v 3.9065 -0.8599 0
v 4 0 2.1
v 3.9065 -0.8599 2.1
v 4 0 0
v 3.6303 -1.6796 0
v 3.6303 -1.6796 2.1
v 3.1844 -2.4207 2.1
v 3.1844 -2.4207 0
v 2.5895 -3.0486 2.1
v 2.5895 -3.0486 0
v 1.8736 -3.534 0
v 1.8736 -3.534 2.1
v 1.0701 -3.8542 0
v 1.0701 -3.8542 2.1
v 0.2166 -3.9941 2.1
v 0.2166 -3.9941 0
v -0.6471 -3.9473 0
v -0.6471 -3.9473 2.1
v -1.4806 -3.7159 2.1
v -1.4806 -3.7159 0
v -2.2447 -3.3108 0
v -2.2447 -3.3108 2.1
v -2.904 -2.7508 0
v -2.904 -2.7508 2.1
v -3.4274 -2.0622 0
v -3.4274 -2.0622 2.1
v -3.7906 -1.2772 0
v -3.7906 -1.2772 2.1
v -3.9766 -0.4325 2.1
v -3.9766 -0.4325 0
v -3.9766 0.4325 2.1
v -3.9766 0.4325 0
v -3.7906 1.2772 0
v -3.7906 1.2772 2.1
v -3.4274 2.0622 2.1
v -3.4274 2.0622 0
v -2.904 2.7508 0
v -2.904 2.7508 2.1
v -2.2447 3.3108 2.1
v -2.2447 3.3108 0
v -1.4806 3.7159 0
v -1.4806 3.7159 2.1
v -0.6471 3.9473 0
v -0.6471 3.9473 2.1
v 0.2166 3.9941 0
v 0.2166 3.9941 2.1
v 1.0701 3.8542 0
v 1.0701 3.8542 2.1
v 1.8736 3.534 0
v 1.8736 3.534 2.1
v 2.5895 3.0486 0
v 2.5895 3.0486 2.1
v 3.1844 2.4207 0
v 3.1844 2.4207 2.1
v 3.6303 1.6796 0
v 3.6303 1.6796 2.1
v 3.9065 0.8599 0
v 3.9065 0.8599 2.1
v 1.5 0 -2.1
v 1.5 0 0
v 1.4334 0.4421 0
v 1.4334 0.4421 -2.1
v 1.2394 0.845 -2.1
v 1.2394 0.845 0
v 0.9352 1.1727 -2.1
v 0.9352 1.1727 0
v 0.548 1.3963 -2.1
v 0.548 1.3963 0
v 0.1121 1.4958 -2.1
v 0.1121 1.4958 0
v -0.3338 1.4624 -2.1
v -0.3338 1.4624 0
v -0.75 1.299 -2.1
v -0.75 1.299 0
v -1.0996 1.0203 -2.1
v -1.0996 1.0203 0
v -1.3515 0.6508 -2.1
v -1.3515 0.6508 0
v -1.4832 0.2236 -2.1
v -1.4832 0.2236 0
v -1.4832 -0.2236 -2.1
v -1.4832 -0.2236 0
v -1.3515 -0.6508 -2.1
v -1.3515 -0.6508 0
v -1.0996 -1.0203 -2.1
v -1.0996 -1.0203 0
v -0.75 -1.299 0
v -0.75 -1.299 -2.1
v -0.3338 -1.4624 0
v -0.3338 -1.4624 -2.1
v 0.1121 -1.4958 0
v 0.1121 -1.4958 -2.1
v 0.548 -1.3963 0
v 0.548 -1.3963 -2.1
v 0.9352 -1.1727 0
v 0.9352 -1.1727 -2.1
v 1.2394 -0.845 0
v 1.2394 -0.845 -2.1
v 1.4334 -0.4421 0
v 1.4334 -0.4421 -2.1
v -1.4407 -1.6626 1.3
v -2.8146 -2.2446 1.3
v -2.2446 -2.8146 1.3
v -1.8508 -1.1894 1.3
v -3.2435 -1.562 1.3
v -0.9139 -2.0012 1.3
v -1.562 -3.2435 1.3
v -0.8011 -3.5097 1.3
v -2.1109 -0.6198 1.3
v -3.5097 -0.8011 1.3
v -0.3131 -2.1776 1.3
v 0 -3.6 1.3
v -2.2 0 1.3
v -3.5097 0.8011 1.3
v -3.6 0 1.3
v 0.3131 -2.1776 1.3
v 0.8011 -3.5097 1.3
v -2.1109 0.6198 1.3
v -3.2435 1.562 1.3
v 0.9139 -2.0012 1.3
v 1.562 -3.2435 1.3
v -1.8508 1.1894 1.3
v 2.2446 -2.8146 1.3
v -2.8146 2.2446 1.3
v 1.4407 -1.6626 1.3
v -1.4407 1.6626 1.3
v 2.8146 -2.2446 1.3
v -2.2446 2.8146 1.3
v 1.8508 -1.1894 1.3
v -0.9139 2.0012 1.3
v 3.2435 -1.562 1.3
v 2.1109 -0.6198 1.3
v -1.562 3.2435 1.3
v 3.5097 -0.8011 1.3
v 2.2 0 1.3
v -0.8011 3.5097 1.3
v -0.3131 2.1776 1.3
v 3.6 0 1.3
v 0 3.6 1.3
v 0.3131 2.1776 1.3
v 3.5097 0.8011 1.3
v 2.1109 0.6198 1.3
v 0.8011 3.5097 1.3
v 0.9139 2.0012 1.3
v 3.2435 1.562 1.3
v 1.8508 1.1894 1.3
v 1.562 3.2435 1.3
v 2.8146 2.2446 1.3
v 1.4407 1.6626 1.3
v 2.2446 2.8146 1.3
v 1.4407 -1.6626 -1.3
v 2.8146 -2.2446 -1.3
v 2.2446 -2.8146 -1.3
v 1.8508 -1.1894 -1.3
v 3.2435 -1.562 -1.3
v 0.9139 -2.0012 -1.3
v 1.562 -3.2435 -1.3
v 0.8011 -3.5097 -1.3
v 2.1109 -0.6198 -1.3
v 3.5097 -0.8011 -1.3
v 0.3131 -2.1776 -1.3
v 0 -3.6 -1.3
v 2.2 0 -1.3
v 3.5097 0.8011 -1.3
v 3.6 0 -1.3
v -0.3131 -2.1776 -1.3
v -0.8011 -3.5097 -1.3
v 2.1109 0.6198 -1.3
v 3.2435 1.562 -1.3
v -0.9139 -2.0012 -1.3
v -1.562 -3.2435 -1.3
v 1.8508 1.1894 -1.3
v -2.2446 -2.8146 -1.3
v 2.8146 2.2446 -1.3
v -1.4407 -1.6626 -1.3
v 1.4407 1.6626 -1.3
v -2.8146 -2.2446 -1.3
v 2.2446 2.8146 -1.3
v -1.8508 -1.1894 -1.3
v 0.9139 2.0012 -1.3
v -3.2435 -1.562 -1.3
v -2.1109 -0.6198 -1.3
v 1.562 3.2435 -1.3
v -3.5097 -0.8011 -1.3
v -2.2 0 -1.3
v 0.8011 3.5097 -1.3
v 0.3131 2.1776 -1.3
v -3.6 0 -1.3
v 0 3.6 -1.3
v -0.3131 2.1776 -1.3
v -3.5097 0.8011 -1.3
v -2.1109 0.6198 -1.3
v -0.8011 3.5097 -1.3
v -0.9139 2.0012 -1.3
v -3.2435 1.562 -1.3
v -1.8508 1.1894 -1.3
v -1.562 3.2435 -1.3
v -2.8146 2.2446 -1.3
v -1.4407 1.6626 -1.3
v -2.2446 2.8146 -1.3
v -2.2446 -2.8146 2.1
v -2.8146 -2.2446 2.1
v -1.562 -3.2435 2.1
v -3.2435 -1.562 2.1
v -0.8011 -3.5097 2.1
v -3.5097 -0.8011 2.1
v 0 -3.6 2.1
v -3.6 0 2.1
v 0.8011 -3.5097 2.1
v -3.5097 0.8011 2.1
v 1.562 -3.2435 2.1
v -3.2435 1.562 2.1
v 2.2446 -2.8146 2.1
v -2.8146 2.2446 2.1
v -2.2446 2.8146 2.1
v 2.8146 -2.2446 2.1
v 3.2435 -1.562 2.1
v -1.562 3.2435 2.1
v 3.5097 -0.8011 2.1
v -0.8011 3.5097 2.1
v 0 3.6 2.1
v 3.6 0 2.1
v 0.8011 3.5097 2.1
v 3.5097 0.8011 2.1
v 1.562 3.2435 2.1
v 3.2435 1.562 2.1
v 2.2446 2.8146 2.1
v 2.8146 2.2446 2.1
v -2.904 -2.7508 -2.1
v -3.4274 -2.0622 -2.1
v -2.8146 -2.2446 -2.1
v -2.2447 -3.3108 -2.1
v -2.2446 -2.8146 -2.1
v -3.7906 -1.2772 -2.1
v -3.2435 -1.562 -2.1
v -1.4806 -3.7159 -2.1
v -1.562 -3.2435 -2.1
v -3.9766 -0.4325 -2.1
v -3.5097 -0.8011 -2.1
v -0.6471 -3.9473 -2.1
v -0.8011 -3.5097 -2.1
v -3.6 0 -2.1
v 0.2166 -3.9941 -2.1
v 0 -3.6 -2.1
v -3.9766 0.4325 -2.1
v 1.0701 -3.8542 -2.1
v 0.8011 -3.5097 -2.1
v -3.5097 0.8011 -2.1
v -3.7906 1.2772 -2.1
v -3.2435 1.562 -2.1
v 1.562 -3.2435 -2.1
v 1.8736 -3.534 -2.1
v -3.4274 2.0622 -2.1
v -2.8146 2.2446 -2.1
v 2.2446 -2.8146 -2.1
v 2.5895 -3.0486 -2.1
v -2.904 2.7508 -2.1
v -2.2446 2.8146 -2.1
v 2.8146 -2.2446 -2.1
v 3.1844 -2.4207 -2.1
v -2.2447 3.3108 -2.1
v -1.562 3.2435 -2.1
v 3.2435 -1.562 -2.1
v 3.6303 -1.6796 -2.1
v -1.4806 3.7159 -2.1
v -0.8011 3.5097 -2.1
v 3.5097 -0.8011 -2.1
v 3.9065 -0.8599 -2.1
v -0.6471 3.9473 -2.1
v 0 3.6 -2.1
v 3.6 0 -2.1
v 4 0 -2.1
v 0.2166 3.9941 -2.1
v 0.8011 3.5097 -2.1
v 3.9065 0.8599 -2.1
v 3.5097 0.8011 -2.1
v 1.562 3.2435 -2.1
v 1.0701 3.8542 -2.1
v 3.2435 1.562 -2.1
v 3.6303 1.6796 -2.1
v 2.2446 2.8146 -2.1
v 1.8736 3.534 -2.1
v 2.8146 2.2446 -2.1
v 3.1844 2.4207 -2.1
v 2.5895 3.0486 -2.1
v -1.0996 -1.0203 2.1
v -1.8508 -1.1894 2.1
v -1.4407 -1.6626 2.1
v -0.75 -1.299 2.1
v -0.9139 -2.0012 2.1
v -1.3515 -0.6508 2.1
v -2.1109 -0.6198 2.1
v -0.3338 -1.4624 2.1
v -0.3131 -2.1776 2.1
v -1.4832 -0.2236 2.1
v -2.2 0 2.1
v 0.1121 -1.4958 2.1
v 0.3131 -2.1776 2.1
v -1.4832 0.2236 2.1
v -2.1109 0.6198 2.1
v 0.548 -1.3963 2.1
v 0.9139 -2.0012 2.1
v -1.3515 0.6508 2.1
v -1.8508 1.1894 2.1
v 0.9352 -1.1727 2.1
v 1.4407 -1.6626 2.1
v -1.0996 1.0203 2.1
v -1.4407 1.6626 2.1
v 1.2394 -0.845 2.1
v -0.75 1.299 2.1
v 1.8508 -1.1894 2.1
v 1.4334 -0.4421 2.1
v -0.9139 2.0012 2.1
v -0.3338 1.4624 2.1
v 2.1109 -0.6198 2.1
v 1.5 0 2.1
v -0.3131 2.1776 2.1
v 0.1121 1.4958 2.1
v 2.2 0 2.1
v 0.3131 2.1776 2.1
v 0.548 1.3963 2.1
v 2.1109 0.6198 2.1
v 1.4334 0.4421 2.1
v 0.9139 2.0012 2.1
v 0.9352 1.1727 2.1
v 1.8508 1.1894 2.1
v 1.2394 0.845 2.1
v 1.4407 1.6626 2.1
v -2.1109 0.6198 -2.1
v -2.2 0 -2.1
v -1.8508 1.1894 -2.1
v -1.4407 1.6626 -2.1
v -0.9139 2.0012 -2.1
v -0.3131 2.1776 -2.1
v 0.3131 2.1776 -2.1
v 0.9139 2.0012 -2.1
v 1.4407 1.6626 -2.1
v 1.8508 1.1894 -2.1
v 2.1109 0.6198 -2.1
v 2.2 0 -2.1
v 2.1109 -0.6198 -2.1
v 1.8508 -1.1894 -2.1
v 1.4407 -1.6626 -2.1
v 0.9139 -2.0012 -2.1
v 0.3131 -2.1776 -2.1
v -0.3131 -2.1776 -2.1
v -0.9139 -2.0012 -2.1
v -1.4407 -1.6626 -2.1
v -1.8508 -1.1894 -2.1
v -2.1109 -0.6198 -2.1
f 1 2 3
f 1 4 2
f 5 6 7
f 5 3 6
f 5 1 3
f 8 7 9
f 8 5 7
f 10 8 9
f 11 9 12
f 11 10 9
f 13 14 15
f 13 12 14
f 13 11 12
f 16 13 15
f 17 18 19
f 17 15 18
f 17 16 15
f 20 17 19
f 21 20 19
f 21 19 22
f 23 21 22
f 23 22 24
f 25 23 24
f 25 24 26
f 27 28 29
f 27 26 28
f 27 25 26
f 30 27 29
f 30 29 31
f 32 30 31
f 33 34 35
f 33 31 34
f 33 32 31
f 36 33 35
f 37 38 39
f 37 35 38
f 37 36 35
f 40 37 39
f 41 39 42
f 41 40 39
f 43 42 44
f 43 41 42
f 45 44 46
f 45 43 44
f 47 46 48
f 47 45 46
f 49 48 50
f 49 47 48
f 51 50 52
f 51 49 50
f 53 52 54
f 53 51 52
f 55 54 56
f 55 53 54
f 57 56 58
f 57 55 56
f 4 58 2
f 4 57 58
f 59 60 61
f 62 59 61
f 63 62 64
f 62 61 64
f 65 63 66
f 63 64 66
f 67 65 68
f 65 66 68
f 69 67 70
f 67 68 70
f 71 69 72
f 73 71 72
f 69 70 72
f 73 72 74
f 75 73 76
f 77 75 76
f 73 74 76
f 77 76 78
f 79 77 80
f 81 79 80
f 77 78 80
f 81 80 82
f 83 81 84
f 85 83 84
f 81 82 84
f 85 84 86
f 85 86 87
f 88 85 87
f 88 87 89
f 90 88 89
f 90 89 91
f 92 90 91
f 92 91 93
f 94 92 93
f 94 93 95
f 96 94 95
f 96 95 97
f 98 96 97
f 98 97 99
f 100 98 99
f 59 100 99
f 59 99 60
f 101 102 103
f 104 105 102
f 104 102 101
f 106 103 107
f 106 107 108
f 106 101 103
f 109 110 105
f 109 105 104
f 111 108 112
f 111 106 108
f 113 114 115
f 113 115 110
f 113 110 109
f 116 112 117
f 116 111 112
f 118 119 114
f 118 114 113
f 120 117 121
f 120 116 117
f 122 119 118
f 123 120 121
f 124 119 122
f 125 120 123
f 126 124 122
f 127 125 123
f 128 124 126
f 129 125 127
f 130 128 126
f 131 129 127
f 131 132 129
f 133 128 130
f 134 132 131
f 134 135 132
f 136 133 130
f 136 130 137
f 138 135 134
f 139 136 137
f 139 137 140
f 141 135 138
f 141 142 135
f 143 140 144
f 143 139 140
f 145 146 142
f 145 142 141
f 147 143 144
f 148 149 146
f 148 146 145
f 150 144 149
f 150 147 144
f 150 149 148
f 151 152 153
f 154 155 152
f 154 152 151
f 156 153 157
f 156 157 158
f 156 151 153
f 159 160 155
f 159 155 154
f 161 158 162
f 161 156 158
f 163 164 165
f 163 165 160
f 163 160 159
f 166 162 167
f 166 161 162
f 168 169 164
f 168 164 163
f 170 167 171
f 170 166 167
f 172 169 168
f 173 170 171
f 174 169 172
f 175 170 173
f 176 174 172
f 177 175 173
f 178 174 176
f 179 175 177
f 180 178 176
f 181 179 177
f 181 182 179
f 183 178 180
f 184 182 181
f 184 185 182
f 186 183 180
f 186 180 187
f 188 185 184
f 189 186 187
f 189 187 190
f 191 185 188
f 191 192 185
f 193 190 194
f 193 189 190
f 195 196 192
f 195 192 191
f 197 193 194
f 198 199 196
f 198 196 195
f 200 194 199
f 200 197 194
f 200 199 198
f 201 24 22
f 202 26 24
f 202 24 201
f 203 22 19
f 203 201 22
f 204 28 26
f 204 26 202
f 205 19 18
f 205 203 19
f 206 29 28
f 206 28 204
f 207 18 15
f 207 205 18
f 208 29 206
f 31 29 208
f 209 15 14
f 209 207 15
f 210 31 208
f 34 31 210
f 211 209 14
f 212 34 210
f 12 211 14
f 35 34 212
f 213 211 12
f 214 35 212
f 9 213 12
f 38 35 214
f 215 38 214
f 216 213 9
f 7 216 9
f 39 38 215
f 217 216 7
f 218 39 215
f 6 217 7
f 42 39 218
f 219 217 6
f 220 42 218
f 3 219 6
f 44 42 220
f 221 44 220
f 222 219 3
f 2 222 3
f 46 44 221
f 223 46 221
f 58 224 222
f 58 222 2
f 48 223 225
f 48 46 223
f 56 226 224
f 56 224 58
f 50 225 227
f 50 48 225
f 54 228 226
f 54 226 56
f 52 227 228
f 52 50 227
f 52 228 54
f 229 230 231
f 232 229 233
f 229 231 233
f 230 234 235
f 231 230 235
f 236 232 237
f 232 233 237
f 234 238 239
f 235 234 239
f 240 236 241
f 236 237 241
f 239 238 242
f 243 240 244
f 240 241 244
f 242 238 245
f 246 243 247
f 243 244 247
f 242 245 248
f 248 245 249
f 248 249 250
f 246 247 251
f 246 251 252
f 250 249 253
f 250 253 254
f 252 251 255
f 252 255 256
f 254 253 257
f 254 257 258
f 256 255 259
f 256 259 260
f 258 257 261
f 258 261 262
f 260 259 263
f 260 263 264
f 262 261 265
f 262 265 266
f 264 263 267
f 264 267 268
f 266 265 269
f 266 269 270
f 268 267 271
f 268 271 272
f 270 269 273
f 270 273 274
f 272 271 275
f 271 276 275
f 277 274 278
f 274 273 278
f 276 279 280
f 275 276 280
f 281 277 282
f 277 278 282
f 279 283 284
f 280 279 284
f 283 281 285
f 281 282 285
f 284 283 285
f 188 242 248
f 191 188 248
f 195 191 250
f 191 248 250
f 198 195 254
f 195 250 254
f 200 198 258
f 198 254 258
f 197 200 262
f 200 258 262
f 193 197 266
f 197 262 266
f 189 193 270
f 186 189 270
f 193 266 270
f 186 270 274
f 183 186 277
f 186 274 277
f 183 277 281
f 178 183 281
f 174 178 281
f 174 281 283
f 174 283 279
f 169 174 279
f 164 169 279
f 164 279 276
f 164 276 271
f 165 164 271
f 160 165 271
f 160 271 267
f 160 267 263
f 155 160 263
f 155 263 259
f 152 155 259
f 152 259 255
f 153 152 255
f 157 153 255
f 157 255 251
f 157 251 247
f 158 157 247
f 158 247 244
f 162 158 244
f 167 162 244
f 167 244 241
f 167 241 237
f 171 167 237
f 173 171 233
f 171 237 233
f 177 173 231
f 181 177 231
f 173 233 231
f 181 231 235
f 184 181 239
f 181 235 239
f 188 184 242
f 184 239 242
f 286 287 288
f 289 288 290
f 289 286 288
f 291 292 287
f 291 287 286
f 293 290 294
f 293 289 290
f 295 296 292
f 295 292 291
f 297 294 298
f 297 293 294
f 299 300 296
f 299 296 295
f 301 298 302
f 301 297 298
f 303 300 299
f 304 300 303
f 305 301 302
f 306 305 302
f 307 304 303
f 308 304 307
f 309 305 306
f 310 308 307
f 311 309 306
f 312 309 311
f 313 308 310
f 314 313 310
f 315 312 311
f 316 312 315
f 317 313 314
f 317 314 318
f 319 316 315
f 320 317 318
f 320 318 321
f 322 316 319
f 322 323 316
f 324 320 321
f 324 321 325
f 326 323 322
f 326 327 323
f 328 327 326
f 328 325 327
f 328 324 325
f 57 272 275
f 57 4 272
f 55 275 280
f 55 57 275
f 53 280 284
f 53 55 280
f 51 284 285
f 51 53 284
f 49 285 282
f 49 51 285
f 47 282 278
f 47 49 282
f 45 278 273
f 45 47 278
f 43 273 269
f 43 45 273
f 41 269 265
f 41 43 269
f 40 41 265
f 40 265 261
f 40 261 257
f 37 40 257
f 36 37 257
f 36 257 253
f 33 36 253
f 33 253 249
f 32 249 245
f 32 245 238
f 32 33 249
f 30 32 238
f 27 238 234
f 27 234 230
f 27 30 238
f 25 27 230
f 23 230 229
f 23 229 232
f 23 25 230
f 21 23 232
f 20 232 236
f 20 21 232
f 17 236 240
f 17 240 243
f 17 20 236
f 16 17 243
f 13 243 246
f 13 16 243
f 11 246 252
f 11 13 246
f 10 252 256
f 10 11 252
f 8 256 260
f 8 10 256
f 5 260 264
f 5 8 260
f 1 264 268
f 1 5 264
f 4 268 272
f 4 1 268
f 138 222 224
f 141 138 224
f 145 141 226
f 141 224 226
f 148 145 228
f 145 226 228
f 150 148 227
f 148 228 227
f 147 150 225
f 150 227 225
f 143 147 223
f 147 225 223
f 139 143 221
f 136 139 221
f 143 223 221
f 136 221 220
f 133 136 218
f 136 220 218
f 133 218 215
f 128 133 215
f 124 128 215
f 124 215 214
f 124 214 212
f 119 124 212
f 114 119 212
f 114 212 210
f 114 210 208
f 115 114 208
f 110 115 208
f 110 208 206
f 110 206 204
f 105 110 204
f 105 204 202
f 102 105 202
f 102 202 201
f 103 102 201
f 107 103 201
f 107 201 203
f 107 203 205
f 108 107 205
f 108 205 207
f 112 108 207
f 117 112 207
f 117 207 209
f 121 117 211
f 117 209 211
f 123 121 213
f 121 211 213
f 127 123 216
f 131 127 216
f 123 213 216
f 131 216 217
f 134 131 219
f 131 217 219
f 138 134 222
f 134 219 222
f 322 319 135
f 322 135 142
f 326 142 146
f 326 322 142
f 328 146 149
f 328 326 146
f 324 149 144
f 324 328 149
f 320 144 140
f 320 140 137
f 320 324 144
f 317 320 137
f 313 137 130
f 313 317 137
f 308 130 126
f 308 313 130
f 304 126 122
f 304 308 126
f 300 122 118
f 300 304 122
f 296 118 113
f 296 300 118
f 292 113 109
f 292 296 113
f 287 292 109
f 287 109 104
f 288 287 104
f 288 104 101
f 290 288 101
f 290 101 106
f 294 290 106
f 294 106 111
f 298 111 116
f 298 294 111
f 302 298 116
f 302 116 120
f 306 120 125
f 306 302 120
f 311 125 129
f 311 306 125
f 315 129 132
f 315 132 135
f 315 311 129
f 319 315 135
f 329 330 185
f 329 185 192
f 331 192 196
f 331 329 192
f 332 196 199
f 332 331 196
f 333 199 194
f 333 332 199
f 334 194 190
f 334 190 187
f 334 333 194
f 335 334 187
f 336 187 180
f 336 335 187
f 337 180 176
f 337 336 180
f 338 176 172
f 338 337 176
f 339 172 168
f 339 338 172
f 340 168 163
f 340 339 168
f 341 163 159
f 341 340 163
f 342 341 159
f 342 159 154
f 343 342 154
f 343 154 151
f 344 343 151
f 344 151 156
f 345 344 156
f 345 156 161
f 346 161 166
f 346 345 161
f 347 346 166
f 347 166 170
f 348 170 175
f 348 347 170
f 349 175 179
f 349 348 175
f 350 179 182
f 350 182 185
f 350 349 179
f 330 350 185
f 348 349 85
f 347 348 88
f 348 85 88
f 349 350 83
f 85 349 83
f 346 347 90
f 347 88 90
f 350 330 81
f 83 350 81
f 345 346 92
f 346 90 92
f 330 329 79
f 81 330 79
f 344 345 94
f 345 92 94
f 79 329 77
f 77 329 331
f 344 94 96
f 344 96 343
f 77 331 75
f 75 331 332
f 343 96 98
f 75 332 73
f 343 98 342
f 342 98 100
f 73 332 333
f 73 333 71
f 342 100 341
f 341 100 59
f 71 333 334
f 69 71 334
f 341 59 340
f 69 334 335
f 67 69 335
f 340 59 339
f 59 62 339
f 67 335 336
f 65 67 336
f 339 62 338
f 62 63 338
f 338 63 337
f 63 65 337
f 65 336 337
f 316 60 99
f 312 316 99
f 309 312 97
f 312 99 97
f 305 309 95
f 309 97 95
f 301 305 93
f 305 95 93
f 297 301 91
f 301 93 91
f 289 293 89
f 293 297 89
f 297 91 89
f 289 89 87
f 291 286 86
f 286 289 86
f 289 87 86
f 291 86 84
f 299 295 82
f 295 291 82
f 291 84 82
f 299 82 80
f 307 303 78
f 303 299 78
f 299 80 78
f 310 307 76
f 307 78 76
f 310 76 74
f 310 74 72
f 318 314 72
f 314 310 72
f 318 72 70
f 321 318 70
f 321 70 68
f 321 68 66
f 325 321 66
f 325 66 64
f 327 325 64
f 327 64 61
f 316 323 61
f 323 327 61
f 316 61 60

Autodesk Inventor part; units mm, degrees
ref_plane "YZ Plane" through (0, 0, 0) normal (1, 0, 0) x (0, 1, 0)
sketch "Sketch1" plane through (0, 0, 0) normal (0, 0, 1) x (1, 0, 0)
  circle A0 centre (0, 0) radius 1.5
  circle A1 centre (0, 0) radius 2.2
  circle A2 centre (0, 0) radius 4
  dimension "d0" = 3
  dimension "d1" = 4.4
  dimension "d2" = 8
extrude "Extrusion1" add sketch "Sketch1" along normal mid plane 4.2 contours A1 | A2
ref_plane "Work Plane1" through (0, 0, 2.1) normal (0, 0, 1) x (1, 0, 0)
sketch "Sketch2" plane through (0, 0, 2.1) normal (0, 0, 1) x (1, 0, 0)
  circle A0 centre (0, 0) radius 2.2
  circle A1 centre (0, 0) radius 3.6
  dimension "d6" = 4.4
  dimension "d7" = 7.2
extrude "Extrusion2" cut sketch "Sketch2" against normal blind 0.8
ref_plane "Work Plane2" through (0, 0, -2.1) normal (0, 0, -1) x (-1, 0, 0)
sketch "Sketch3" plane through (0, 0, -2.1) normal (0, 0, -1) x (-1, 0, 0)
  circle A0 centre (0, 0) radius 3.6
  circle A1 centre (0, 0) radius 2.2
extrude "Extrusion3" cut sketch "Sketch3" against normal blind 0.8
properties part number "New_main_wheel"
